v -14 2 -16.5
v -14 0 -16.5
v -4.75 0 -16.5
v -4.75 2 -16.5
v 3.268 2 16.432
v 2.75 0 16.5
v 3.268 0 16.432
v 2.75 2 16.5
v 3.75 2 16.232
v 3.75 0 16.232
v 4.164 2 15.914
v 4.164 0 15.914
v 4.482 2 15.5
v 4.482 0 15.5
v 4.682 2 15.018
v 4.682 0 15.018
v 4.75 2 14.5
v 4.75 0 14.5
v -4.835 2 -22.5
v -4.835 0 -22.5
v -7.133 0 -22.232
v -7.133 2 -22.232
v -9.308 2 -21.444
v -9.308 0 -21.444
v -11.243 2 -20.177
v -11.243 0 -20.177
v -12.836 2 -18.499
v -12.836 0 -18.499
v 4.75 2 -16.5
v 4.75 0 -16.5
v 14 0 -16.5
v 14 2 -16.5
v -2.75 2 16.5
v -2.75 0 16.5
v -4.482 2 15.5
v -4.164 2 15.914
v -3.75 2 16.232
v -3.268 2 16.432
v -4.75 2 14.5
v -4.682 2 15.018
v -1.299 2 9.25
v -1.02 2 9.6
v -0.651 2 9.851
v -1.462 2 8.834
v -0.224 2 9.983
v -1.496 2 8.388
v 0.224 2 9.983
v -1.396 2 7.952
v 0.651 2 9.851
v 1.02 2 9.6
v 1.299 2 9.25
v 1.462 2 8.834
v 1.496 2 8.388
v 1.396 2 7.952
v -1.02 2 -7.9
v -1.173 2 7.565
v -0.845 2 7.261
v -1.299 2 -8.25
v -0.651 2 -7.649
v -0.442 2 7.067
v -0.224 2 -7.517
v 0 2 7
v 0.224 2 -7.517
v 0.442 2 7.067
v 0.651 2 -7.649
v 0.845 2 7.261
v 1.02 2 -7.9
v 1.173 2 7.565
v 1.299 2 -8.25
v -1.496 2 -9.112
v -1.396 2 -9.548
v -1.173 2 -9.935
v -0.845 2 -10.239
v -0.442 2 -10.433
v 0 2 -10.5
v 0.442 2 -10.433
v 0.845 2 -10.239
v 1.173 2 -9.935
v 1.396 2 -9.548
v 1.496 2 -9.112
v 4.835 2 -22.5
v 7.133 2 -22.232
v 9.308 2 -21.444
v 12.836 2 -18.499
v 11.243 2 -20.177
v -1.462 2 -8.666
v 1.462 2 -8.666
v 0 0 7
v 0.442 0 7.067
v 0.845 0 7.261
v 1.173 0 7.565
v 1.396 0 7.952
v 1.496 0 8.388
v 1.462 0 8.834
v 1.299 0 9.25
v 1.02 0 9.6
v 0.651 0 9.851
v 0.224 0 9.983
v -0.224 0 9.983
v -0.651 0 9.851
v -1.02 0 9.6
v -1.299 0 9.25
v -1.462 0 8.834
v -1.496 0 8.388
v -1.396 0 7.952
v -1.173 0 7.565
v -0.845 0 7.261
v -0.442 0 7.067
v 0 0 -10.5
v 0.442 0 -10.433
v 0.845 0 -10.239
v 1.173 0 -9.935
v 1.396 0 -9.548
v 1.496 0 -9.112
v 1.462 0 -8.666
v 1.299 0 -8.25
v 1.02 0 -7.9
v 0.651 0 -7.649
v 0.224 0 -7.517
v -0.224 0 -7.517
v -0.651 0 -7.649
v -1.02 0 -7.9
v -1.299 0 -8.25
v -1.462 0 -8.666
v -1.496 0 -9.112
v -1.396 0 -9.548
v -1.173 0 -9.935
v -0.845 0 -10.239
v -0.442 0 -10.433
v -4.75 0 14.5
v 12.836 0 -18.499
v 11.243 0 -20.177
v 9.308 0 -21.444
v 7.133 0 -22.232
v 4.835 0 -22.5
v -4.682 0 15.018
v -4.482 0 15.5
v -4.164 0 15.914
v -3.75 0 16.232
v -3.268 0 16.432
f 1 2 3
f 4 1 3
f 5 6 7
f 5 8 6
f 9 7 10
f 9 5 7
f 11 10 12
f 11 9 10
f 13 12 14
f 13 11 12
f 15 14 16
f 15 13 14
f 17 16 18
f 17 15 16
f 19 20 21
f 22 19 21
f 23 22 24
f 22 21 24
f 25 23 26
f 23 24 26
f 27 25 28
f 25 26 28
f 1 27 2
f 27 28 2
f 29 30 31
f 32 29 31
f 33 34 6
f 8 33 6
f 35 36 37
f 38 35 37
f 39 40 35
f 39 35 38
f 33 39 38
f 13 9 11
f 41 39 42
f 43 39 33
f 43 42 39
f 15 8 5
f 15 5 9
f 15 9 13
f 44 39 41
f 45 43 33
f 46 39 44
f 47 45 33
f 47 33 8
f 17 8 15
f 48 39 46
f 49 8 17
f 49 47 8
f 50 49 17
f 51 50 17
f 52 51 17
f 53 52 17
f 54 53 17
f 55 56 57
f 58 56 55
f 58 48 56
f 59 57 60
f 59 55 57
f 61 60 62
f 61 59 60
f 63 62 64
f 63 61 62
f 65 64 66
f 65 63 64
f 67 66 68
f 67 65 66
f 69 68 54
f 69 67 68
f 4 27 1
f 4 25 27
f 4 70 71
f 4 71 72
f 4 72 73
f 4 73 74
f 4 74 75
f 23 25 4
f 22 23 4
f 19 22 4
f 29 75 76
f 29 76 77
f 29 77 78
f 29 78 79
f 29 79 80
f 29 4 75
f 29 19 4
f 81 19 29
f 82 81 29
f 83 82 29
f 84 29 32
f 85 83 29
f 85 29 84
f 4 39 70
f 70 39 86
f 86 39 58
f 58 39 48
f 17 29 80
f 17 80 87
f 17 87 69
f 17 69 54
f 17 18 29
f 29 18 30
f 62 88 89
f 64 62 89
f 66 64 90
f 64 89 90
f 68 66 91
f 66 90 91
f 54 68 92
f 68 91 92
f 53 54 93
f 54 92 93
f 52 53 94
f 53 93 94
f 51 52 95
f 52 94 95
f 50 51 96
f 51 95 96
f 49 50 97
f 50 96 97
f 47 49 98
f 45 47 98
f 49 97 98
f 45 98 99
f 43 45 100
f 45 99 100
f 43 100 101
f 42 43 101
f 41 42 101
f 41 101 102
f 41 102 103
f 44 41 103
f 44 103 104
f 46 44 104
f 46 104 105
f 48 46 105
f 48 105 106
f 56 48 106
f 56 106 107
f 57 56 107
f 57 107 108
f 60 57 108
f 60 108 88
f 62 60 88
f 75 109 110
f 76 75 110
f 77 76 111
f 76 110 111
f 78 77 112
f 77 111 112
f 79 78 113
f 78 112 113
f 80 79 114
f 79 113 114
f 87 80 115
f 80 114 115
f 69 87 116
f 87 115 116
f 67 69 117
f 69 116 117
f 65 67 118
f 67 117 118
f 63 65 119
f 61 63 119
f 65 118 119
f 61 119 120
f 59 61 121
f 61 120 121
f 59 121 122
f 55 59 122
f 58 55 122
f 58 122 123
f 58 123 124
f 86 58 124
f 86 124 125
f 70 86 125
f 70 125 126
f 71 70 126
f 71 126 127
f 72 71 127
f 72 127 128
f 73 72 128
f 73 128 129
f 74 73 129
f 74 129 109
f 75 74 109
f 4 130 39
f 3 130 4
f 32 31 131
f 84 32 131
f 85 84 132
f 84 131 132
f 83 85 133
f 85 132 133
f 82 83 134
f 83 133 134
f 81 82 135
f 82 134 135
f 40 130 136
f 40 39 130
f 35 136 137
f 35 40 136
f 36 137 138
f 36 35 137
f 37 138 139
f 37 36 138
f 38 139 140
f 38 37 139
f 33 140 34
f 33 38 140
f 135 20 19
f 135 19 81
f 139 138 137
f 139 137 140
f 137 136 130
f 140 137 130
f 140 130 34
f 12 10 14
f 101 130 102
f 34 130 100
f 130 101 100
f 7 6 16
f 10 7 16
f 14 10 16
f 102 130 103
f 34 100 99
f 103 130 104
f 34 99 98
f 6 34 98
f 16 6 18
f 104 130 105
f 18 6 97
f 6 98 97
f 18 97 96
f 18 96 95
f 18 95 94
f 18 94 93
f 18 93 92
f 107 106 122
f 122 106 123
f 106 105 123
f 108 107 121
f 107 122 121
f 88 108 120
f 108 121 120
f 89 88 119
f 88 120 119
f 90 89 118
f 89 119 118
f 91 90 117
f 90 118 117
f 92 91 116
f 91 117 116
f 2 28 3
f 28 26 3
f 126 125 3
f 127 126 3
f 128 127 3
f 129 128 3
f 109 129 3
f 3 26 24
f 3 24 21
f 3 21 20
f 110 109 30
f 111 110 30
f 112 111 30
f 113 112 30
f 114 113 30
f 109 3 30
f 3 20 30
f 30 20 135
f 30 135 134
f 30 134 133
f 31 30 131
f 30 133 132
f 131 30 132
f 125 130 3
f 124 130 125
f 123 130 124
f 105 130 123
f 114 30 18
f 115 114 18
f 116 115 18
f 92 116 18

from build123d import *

# Parameters (mm, degrees)
SKETCH1_W           = 9.5
SKETCH1_H           = 33
SKETCH1_W_2         = 28
SKETCH1_H_2         = 6
BOSS_EXTRUDE2_DEPTH = 2
SKETCH2_R           = 1.5
CUT_EXTRUDE1_DEPTH  = 27.575364532
FILLET6_R           = 10
FILLET7_R           = 10
FILLET10_R          = 2


with BuildPart() as part:
    # Sketch1 → Boss-Extrude2 (new body)
    with BuildSketch(Plane(origin=(0, 0, 0), x_dir=(1, 0, 0), z_dir=(0, 1, 0))):
        Rectangle(SKETCH1_W, SKETCH1_H)
        with Locations((0, 19.5)):
            Rectangle(SKETCH1_W_2, SKETCH1_H_2)
    extrude(amount=BOSS_EXTRUDE2_DEPTH)

    # Sketch2 → Cut-Extrude1 (cut, through all)
    with BuildSketch(Plane.XZ):
        with Locations(Location((0, 8.5, 0), (0, 0, 270))):
            Circle(SKETCH2_R)
        with Locations(Location((0, -9, 0), (0, 0, 270))):
            Circle(SKETCH2_R)
    extrude(amount=-CUT_EXTRUDE1_DEPTH, mode=Mode.SUBTRACT)

    # Fillet6
    # the kernel refuses this fillet: 10 mm, written as the material it takes off along each edge
    with BuildSketch(Plane(origin=(14, -22.912878475, -22.5), x_dir=(-1, 0, 0), z_dir=(0, 1, 0))) as fillet6_piece_1:
        with BuildLine():
            CenterArc((9.16515139, 10), FILLET6_R, 203.578178478, 66.421821522)
            Line((0, 6), (-0.183303028, 5.92))
            ThreePointArc((-0.183303028, 5.92), (-0.2, 3), (-0.2, 0))
            Line((-0.2, 0), (0, -0.2))
            Line((0, -0.2), (9.16515139, -0.2))
            Line((9.16515139, -0.2), (9.16515139, 0))
        make_face()
    extrude(amount=47.82575695, mode=Mode.SUBTRACT)

    # Fillet7
    # the kernel refuses this fillet: 10 mm, written as the material it takes off along each edge
    with BuildSketch(Plane(origin=(-14, -22.912878475, -22.5), x_dir=(0, 0, 1), z_dir=(0, 1, 0))) as fillet7_piece_1:
        with BuildLine():
            CenterArc((10, 9.16515139), FILLET7_R, 180, 66.421821522)
            Line((0, 9.16515139), (-0.2, 9.16515139))
            Line((-0.2, 9.16515139), (-0.2, 0))
            Line((-0.2, 0), (0, -0.2))
            ThreePointArc((0, -0.2), (3, -0.2), (5.92, -0.183303028))
            Line((5.92, -0.183303028), (6, 0))
        make_face()
    extrude(amount=47.82575695, mode=Mode.SUBTRACT)

    # Fillet10
    fillet10_edges = [part.edges().sort_by_distance(p)[0] for p in [
        (4.75, 1, 16.5),
        (-4.75, 1, 16.5),
    ]]
    fillet(fillet10_edges, radius=FILLET10_R)


solid = part.part
